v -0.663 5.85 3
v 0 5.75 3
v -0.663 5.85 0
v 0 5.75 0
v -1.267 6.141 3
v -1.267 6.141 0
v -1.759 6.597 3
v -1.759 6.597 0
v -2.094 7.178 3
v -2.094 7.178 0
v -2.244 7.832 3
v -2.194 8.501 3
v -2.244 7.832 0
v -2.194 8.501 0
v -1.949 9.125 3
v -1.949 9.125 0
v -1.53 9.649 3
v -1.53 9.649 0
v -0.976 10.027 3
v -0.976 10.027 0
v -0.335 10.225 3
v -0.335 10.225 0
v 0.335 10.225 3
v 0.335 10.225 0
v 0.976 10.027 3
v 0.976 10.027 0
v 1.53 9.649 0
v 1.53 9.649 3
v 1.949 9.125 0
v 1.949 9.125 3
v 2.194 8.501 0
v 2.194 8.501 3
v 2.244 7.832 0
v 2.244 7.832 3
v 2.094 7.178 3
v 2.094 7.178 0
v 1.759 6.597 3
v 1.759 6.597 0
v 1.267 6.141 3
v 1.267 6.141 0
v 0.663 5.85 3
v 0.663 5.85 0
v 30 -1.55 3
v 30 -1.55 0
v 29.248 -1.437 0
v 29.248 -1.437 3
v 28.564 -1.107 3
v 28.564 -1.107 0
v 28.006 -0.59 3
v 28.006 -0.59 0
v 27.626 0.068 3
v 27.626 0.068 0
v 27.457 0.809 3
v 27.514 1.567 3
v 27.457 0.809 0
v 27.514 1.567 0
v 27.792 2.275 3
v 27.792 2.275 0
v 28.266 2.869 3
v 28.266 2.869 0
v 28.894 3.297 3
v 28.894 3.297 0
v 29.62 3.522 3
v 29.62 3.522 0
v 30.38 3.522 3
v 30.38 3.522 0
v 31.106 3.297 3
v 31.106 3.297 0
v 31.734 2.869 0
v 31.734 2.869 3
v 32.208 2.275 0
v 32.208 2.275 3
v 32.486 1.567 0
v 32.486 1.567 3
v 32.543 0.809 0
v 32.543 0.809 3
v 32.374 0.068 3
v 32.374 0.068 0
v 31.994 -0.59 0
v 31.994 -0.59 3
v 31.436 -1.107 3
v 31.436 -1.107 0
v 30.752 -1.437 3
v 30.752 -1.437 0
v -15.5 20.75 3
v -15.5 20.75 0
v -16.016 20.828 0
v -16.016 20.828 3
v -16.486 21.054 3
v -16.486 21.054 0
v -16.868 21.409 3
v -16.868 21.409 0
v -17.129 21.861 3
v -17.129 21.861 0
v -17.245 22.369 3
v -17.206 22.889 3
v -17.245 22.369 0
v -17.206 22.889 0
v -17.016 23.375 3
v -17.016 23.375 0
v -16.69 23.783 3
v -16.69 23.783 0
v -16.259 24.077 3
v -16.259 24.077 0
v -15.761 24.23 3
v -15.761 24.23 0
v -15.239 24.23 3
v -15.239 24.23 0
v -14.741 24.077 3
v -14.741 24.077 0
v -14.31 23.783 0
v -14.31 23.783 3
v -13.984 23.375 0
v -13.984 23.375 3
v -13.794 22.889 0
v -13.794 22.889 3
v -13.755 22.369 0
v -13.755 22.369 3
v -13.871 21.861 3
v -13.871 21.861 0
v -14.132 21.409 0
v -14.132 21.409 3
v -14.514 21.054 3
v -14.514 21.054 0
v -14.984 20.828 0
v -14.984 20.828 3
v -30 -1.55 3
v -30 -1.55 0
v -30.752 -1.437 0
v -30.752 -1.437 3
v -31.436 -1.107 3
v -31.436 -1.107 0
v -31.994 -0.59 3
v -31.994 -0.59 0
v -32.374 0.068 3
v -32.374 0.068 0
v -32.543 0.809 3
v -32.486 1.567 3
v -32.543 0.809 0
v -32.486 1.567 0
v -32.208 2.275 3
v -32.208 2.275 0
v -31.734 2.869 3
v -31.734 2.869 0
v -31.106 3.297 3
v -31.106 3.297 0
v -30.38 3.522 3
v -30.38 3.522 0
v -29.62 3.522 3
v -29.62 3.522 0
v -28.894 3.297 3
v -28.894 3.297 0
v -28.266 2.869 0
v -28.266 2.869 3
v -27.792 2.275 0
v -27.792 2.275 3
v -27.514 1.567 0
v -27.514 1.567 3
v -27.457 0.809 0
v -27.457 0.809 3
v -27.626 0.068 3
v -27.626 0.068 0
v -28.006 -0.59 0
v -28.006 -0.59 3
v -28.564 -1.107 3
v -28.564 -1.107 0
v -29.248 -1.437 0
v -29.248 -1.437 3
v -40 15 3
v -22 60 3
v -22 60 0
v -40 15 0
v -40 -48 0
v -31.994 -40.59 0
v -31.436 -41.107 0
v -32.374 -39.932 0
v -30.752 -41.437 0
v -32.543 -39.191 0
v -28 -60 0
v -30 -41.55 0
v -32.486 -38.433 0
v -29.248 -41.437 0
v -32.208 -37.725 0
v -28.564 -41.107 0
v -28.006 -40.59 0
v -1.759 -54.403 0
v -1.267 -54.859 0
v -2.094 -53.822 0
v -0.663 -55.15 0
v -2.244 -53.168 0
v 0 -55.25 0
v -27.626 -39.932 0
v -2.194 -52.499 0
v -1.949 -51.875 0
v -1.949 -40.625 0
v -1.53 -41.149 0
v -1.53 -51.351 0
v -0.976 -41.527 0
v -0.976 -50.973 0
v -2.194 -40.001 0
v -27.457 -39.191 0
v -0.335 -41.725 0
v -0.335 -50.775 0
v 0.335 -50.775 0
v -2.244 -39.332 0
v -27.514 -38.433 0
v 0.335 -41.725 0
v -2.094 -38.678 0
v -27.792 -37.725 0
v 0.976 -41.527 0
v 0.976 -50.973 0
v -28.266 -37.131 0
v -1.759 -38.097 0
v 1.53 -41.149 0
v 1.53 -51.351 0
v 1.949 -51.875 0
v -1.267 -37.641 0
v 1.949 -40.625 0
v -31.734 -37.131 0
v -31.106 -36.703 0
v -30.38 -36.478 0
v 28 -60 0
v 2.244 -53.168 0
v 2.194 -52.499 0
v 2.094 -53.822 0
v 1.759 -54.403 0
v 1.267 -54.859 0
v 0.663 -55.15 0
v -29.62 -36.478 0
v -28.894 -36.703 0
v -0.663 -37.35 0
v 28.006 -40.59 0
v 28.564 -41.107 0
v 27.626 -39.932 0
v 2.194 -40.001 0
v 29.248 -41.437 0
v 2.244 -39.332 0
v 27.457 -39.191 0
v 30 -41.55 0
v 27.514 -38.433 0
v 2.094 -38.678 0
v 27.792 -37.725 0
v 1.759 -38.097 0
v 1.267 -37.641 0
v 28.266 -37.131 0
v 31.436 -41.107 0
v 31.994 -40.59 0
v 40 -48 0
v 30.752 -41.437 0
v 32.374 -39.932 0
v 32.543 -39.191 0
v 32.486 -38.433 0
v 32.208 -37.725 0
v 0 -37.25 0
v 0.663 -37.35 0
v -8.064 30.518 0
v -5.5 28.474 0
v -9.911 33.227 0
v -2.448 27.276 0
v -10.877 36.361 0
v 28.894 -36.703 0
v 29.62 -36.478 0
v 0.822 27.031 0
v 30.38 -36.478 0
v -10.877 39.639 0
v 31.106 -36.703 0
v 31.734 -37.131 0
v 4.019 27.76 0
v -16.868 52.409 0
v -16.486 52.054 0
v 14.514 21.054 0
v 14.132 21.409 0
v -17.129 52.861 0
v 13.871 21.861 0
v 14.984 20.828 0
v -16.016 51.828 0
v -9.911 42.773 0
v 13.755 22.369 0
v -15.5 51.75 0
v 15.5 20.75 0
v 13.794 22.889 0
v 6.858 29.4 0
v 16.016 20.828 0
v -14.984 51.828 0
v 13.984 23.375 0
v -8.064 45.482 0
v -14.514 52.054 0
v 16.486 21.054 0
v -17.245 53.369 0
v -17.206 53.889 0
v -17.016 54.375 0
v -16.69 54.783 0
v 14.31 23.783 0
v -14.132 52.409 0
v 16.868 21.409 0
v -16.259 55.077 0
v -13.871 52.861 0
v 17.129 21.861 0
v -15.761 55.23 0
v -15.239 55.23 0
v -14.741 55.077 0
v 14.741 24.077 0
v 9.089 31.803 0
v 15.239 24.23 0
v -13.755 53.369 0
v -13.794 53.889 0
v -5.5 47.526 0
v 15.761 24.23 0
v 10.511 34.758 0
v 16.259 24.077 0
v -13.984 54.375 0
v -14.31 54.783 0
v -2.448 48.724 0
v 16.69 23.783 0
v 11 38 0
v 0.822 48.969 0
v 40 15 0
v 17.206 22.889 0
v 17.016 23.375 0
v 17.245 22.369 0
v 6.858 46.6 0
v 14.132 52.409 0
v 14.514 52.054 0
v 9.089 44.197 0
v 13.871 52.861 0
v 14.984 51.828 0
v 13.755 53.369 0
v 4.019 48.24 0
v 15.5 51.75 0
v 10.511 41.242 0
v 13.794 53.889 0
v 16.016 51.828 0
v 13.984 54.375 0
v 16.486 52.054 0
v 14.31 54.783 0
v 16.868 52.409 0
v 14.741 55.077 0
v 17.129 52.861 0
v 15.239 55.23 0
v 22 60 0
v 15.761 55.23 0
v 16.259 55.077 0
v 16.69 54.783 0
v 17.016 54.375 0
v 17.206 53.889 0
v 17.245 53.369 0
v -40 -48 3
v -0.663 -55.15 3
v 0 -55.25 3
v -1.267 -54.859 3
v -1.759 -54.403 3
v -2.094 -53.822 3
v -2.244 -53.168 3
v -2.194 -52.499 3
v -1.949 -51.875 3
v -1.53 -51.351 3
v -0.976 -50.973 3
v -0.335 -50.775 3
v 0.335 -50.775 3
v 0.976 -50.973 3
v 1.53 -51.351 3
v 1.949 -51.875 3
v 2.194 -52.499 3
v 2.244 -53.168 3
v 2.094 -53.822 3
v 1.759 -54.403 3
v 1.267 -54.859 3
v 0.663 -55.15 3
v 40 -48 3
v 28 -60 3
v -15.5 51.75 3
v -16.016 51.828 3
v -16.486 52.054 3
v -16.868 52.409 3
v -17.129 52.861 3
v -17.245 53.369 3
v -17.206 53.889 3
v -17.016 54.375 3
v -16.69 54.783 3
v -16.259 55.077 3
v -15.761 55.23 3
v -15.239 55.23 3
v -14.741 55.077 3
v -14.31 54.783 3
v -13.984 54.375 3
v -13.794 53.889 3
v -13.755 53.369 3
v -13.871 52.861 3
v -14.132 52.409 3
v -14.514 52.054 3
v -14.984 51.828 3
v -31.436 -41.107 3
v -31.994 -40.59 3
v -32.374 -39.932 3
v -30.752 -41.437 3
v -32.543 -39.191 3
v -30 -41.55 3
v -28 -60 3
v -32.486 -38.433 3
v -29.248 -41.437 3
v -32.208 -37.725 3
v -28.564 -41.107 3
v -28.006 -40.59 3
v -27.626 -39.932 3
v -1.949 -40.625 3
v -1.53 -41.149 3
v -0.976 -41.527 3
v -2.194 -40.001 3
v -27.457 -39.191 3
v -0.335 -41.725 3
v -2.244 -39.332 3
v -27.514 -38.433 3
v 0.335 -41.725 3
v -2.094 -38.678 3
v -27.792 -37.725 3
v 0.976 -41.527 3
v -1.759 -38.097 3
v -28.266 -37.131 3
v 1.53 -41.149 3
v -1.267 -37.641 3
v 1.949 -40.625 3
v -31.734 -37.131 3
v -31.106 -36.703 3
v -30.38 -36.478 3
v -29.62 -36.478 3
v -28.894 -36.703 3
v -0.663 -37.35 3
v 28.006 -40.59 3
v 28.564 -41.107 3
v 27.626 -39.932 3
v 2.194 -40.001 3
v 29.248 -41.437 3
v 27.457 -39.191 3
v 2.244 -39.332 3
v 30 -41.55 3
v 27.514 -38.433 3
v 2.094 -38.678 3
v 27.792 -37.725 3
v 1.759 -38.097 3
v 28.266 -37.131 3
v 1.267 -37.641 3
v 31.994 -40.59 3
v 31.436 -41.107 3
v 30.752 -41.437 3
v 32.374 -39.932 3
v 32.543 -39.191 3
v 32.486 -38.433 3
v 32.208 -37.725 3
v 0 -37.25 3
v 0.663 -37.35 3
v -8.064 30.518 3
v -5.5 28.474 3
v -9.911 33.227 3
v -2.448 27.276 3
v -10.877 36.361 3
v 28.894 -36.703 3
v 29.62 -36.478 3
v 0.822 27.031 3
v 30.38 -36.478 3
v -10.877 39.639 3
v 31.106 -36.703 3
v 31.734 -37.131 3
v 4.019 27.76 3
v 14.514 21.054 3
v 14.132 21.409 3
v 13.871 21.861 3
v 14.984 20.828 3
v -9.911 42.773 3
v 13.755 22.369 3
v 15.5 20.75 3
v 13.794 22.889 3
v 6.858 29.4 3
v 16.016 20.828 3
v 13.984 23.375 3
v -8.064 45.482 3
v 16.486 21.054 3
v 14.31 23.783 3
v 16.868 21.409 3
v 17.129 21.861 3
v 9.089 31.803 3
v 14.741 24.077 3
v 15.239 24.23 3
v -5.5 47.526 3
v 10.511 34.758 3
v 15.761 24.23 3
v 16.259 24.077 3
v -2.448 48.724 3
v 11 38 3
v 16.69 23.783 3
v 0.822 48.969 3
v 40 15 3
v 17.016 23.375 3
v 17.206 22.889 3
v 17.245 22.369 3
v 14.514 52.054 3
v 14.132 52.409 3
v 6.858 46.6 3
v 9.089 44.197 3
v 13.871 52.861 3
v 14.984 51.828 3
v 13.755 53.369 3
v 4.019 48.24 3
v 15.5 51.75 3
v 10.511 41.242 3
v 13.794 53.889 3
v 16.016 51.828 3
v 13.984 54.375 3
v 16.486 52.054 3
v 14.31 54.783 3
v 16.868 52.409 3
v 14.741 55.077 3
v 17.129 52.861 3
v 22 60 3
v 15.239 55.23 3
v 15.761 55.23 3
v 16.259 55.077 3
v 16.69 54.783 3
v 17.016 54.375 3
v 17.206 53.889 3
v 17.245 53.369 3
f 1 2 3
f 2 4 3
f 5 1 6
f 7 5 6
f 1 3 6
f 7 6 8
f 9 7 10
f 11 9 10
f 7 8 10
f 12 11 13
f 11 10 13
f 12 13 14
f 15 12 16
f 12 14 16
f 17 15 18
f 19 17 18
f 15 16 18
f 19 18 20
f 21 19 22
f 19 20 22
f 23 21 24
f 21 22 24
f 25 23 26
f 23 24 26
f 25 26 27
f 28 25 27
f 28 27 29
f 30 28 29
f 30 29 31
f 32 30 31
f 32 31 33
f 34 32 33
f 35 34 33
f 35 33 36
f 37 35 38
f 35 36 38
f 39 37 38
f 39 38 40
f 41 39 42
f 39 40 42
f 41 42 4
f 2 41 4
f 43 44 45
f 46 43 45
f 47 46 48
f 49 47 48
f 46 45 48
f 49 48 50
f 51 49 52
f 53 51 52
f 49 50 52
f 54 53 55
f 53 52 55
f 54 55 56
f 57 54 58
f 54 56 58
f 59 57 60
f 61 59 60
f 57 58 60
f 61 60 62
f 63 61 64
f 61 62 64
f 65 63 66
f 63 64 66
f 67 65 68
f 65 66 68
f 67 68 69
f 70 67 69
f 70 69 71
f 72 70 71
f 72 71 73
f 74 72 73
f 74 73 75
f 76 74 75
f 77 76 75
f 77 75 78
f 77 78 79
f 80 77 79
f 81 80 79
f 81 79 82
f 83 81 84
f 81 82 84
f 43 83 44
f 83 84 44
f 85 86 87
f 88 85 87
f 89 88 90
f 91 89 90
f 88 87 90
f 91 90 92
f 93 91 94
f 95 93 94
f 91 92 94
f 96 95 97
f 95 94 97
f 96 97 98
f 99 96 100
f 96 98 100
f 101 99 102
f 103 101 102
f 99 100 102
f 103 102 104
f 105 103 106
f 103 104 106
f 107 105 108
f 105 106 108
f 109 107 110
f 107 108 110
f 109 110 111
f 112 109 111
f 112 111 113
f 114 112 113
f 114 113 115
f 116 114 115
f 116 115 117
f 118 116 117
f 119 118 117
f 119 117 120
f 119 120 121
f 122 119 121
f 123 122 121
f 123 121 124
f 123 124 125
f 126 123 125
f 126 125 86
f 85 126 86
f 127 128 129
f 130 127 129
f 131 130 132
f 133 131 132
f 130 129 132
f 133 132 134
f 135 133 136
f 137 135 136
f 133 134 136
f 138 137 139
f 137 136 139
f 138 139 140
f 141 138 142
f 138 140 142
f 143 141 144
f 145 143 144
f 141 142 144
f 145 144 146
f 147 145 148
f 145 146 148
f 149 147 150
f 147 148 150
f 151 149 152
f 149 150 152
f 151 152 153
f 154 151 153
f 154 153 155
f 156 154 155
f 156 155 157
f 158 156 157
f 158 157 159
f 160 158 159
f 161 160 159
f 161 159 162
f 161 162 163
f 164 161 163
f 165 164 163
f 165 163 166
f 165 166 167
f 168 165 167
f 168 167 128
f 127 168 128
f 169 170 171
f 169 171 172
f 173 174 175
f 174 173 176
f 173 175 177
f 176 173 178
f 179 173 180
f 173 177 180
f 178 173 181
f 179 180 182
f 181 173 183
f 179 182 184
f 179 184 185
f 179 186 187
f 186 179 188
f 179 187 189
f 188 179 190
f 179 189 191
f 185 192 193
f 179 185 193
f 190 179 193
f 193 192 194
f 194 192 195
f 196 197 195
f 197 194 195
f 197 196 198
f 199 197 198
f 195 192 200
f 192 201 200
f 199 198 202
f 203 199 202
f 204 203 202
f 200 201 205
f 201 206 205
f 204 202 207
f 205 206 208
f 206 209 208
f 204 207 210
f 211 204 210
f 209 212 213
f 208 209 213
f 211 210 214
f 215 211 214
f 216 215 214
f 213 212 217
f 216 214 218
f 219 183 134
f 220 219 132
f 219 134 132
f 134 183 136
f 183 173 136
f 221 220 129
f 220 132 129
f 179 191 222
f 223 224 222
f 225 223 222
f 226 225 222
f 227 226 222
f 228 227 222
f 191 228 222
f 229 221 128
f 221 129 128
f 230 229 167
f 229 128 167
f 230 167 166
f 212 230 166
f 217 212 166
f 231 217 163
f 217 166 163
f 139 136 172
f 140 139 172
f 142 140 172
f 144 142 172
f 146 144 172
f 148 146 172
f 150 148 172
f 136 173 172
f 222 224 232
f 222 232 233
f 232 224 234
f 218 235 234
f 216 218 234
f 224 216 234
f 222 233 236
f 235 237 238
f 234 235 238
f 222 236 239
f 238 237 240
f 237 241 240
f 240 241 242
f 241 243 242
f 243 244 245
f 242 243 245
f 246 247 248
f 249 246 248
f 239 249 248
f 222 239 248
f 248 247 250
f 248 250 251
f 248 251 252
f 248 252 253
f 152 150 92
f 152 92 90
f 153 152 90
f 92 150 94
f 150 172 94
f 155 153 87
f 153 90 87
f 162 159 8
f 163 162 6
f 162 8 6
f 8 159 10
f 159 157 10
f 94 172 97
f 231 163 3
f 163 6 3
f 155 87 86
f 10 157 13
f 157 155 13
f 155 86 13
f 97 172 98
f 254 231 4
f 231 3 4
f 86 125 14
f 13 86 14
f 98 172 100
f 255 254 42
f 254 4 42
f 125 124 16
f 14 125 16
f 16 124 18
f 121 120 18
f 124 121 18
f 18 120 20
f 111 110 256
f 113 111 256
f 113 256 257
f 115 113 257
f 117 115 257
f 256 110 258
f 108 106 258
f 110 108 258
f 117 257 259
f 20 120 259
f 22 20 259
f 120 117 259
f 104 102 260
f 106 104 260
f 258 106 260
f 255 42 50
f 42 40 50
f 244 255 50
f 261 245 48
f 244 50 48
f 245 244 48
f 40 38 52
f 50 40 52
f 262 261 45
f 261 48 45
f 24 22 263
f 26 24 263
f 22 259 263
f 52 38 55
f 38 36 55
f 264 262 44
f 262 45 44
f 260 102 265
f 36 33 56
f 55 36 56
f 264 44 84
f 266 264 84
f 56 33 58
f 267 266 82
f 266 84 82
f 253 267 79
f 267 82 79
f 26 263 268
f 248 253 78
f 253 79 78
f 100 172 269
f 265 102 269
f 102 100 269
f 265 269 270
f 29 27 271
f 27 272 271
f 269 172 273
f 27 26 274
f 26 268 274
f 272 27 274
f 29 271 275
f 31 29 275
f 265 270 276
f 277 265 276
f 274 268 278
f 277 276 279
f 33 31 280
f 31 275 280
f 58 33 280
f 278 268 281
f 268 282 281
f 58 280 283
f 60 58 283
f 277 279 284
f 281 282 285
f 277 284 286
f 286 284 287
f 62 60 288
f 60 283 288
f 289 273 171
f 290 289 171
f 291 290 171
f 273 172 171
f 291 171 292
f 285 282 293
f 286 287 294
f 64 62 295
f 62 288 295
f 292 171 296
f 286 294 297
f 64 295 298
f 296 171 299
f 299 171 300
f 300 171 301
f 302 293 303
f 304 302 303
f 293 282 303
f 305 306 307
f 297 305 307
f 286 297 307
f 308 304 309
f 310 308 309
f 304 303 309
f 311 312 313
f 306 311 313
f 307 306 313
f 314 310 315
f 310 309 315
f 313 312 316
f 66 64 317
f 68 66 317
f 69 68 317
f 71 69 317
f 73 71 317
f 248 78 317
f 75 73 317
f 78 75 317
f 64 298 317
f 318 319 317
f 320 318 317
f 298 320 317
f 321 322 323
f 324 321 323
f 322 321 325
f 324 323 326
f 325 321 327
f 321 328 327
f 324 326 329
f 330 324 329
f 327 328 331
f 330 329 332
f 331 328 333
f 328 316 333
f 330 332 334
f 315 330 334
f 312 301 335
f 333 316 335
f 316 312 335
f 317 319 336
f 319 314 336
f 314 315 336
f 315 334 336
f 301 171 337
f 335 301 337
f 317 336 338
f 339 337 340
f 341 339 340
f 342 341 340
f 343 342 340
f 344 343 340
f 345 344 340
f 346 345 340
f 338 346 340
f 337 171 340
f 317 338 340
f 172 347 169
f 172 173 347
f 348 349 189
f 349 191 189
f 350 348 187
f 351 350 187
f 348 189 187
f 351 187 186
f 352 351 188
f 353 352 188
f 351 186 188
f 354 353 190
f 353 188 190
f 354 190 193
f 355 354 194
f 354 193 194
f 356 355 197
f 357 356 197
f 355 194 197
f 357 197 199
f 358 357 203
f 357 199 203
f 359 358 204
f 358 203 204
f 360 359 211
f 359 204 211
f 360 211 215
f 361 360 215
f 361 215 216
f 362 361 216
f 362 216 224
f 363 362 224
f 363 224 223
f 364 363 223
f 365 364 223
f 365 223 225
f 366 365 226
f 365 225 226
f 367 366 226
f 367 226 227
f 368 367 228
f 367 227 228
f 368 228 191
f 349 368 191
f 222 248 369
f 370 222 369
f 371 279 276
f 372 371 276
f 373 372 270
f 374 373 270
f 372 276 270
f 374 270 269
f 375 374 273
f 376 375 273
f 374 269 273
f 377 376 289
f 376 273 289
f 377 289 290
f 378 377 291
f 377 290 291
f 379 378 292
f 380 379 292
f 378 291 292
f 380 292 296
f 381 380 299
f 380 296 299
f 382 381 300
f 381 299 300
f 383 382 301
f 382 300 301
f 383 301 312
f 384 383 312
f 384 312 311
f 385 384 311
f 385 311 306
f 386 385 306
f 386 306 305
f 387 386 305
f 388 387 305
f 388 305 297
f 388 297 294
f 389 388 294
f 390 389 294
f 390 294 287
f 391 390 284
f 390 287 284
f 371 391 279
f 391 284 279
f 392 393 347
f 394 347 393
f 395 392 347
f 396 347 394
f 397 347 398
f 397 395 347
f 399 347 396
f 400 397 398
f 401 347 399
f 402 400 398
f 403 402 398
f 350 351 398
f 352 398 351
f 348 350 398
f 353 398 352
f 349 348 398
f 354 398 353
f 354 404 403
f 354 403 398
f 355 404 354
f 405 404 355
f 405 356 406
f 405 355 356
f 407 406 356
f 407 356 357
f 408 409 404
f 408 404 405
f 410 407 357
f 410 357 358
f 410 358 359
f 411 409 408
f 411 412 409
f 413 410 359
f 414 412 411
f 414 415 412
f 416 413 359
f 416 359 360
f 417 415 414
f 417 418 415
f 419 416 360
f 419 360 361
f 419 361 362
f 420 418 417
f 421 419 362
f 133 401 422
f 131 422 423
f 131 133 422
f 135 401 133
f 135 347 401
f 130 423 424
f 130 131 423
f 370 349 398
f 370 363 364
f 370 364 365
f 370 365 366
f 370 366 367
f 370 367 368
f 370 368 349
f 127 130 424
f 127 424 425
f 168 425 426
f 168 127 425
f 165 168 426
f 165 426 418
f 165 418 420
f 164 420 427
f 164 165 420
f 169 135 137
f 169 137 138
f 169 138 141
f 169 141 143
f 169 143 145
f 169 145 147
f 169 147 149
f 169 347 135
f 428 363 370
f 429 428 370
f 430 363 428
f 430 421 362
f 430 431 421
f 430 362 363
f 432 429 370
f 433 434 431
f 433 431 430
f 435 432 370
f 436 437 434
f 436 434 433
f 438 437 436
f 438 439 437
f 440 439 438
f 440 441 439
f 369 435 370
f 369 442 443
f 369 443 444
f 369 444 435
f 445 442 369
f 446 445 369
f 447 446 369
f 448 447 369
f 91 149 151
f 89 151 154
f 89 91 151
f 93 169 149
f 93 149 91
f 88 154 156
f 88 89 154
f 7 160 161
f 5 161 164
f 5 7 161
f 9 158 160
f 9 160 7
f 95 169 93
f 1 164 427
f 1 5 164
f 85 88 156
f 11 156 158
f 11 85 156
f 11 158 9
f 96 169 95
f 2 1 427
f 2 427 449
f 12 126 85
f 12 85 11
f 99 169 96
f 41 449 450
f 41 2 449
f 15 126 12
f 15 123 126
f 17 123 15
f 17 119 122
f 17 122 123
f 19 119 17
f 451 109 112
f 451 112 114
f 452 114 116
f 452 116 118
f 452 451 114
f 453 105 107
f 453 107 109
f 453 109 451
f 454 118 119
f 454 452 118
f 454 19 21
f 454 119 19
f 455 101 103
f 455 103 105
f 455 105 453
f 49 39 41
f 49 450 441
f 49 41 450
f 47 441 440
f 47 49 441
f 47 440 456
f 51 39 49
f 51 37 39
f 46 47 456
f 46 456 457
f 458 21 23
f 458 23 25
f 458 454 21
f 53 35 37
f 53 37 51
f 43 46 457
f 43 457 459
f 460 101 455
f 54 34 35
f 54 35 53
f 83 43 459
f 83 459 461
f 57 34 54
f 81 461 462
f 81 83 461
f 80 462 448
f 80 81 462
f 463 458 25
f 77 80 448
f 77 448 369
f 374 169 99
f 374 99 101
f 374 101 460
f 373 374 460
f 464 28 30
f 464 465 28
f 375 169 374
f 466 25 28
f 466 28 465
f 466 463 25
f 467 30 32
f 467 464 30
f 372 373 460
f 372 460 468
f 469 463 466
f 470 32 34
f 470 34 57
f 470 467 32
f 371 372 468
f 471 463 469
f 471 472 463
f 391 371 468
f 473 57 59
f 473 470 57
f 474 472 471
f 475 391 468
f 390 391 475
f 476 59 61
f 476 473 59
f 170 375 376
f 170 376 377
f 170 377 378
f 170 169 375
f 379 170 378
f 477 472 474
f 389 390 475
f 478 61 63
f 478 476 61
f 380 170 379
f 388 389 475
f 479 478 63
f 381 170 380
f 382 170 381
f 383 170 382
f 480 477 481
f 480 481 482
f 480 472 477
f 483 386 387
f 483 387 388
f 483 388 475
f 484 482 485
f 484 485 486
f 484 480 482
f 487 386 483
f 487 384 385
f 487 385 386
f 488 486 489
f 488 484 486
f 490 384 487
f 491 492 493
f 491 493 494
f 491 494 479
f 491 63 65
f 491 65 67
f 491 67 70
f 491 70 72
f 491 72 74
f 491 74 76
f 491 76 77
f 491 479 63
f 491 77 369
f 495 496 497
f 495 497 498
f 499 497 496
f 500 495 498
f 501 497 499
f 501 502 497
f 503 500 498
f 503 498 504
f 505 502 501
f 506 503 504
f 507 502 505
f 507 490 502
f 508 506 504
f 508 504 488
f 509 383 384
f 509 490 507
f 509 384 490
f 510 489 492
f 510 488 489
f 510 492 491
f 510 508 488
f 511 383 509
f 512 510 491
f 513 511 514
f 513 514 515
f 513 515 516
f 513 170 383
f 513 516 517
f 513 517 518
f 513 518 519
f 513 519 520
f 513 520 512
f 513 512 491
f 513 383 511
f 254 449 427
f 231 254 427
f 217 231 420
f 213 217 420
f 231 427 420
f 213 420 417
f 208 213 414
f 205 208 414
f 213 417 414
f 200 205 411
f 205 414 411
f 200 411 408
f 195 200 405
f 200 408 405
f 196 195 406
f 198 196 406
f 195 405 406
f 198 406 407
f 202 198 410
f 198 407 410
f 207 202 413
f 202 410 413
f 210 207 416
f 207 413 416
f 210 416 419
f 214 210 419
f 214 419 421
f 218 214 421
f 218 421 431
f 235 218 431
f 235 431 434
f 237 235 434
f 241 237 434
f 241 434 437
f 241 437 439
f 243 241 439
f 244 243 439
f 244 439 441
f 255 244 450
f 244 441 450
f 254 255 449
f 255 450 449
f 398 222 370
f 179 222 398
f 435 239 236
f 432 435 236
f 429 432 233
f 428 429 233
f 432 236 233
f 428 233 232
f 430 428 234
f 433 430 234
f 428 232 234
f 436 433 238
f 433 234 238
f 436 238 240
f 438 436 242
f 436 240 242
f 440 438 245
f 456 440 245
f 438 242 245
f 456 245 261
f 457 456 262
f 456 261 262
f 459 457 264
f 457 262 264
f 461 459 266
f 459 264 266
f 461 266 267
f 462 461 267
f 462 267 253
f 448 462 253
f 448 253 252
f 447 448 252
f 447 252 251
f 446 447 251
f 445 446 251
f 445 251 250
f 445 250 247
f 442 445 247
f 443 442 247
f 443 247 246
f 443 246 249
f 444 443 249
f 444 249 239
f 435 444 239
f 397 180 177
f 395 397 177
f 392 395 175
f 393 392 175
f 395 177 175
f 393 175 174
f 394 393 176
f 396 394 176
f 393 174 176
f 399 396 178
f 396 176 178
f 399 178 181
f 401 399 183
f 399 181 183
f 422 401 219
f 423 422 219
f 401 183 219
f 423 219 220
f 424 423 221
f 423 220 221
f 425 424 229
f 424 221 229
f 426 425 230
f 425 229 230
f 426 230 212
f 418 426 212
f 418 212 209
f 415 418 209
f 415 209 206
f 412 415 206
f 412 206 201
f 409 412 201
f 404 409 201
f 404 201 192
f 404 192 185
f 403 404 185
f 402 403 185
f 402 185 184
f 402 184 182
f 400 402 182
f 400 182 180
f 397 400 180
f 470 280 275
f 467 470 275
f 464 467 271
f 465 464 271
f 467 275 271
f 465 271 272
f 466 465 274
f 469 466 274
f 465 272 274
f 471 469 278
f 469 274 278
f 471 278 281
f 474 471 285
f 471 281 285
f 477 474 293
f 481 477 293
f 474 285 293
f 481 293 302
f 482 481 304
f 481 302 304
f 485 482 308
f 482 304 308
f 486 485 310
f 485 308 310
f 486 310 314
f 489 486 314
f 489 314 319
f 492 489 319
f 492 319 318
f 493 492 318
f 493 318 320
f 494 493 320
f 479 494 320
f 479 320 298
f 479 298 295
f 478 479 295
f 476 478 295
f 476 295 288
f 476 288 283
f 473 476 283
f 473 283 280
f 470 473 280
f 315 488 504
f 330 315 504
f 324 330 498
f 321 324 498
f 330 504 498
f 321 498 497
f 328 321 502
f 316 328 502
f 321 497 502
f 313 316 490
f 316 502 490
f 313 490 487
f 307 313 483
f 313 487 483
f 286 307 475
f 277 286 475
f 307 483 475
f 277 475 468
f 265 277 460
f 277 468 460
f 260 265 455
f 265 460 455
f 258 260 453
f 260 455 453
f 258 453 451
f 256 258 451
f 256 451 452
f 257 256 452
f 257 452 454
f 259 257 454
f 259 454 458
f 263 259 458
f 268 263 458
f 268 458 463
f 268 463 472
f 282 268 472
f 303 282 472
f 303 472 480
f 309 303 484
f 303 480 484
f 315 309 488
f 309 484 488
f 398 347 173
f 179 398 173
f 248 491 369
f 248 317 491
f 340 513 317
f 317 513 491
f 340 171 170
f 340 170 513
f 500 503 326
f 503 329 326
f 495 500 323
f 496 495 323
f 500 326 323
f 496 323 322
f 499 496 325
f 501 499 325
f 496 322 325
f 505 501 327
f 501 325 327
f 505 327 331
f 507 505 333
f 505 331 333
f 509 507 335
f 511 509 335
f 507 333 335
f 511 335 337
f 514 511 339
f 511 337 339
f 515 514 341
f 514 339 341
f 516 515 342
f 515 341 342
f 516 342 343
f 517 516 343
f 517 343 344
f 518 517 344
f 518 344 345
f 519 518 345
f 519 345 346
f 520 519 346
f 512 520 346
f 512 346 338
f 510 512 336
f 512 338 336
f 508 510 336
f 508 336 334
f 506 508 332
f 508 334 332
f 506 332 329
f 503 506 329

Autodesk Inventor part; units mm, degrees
ref_plane "YZ Plane" through (0, 0, 0) normal (1, 0, 0) x (0, 1, 0)
ref_plane "XZ Plane" through (0, 0, 0) normal (0, 1, 0) x (-1, 0, 0)
ref_plane "XY Plane" through (0, 0, 0) normal (0, 0, 1) x (1, 0, 0)
sketch "Sketch1" plane through (0, 0, 0) normal (0, 0, 1) x (1, 0, 0)
  line L0 (-40, 60) -> (40, 60)
  line L1 (40, 60) -> (40, -60)
  line L2 (40, -60) -> (-40, -60)
  line L3 (-40, -60) -> (-40, 60)
  line L4 (-40, 60) -> (40, -60) construction
  line L5 (40, 60) -> (-40, -60) construction
  point P0 (0, 0)
  dimension "d0" = 80
  dimension "d1" = 120
extrude "Extrusion1" add sketch "Sketch1" along normal blind 3
sketch "Sketch2" plane through (0, 0, 3) normal (0, 0, 1) x (1, 0, 0)
  line L0 (-40, -60) -> (40, -60) projected
  line L1 (-40, 60) -> (-40, -60) projected
  point P0 (0, 0)
  point P1 (-30, -39)
  point P2 (30, -39)
  point P3 (-30, 1)
  point P4 (30, 1)
  dimension "d4" = 21
  dimension "d5" = 10
  dimension "d6" = 40
  dimension "d7" = 60
hole "Hole1" at (-30, -39, 3) at (30, -39, 3) at (-30, 1, 3) at (30, 1, 3) direction (0, 0, -1) diameter 5.1 end through all
sketch "Sketch3" plane through (0, 0, 3) normal (0, 0, 1) x (1, 0, 0)
  circle A0 centre (0, 38) radius 11
  point P0 (0, 0)
  dimension "d15" = 22
  dimension "d16" = 38
extrude "Extrusion2" cut sketch "Sketch3" against normal through all
sketch "Sketch4" plane through (0, 0, 3) normal (0, 0, 1) x (1, 0, 0)
  circle A0 centre (0, 38) radius 11 projected
  line L0 (-15.5, 53.5) -> (15.5, 53.5)
  line L1 (15.5, 53.5) -> (15.5, 22.5)
  line L2 (15.5, 22.5) -> (-15.5, 22.5)
  line L3 (-15.5, 22.5) -> (-15.5, 53.5)
  line L4 (-15.5, 53.5) -> (15.5, 22.5) construction
  line L5 (15.5, 53.5) -> (-15.5, 22.5) construction
  point P0 (0, 0)
  dimension "d19" = 31
  dimension "d20" = 31
hole "Hole2" at (-15.5, 53.5, 3) at (-15.5, 22.5, 3) at (15.5, 22.5, 3) at (15.5, 53.5, 3) direction (0, 0, -1) diameter 3.5 end through all
sketch "Sketch5" plane through (0, 0, 3) normal (0, 0, 1) x (1, 0, 0)
  line L0 (40, 60) -> (-40, 60) projected
  line L1 (-22, 60) -> (-40, 15)
  line L2 (-40, 60) -> (-40, -60) projected
  line L3 (22, 60) -> (40, 15)
  line L4 (40, -60) -> (40, 60) projected
  point P0 (0, 0)
  dimension "d28" = 15
  dimension "d29" = 15
  dimension "d30" = 18
  dimension "d31" = 18
  dimension "d32" = 44
extrude "Extrusion3" cut sketch "Sketch5" against normal through all
sketch "Sketch7" plane through (0, 0, 0) normal (0, 0, -1) x (-1, 0, 0)
  line L0 (40, -60) -> (-40, -60) projected
  point P0 (0, 0)
  point P1 (0, -39.5)
  dimension "d41" = 20.5
hole "Hole3" at (0, -39.5, 0) direction (0, 0, 1) diameter 4.5 end through all
chamfer "Chamfer1" distance 12 angle 45 2 edges at (-40, -60, 1.5) (40, -60, 1.5)
sketch "Sketch11" plane through (0, 0, 3) normal (0, 0, 1) x (1, 0, 0)
  line L0 (-28, -60) -> (28, -60) projected
  circle A0 centre (0, 38) radius 11 projected
  point P0 (0, 0)
  point P1 (0, 8)
  point P2 (0, -53)
  dimension "d67" = 7
  dimension "d68" = 30
hole "Hole5" at (0, 8, 3) at (0, -53, 3) direction (0, 0, -1) diameter 4.5 end through all
equation "\"d29\" = d28"
equation "\"d31\" = d30"
properties part number "Z-Axis - Back Plate"
